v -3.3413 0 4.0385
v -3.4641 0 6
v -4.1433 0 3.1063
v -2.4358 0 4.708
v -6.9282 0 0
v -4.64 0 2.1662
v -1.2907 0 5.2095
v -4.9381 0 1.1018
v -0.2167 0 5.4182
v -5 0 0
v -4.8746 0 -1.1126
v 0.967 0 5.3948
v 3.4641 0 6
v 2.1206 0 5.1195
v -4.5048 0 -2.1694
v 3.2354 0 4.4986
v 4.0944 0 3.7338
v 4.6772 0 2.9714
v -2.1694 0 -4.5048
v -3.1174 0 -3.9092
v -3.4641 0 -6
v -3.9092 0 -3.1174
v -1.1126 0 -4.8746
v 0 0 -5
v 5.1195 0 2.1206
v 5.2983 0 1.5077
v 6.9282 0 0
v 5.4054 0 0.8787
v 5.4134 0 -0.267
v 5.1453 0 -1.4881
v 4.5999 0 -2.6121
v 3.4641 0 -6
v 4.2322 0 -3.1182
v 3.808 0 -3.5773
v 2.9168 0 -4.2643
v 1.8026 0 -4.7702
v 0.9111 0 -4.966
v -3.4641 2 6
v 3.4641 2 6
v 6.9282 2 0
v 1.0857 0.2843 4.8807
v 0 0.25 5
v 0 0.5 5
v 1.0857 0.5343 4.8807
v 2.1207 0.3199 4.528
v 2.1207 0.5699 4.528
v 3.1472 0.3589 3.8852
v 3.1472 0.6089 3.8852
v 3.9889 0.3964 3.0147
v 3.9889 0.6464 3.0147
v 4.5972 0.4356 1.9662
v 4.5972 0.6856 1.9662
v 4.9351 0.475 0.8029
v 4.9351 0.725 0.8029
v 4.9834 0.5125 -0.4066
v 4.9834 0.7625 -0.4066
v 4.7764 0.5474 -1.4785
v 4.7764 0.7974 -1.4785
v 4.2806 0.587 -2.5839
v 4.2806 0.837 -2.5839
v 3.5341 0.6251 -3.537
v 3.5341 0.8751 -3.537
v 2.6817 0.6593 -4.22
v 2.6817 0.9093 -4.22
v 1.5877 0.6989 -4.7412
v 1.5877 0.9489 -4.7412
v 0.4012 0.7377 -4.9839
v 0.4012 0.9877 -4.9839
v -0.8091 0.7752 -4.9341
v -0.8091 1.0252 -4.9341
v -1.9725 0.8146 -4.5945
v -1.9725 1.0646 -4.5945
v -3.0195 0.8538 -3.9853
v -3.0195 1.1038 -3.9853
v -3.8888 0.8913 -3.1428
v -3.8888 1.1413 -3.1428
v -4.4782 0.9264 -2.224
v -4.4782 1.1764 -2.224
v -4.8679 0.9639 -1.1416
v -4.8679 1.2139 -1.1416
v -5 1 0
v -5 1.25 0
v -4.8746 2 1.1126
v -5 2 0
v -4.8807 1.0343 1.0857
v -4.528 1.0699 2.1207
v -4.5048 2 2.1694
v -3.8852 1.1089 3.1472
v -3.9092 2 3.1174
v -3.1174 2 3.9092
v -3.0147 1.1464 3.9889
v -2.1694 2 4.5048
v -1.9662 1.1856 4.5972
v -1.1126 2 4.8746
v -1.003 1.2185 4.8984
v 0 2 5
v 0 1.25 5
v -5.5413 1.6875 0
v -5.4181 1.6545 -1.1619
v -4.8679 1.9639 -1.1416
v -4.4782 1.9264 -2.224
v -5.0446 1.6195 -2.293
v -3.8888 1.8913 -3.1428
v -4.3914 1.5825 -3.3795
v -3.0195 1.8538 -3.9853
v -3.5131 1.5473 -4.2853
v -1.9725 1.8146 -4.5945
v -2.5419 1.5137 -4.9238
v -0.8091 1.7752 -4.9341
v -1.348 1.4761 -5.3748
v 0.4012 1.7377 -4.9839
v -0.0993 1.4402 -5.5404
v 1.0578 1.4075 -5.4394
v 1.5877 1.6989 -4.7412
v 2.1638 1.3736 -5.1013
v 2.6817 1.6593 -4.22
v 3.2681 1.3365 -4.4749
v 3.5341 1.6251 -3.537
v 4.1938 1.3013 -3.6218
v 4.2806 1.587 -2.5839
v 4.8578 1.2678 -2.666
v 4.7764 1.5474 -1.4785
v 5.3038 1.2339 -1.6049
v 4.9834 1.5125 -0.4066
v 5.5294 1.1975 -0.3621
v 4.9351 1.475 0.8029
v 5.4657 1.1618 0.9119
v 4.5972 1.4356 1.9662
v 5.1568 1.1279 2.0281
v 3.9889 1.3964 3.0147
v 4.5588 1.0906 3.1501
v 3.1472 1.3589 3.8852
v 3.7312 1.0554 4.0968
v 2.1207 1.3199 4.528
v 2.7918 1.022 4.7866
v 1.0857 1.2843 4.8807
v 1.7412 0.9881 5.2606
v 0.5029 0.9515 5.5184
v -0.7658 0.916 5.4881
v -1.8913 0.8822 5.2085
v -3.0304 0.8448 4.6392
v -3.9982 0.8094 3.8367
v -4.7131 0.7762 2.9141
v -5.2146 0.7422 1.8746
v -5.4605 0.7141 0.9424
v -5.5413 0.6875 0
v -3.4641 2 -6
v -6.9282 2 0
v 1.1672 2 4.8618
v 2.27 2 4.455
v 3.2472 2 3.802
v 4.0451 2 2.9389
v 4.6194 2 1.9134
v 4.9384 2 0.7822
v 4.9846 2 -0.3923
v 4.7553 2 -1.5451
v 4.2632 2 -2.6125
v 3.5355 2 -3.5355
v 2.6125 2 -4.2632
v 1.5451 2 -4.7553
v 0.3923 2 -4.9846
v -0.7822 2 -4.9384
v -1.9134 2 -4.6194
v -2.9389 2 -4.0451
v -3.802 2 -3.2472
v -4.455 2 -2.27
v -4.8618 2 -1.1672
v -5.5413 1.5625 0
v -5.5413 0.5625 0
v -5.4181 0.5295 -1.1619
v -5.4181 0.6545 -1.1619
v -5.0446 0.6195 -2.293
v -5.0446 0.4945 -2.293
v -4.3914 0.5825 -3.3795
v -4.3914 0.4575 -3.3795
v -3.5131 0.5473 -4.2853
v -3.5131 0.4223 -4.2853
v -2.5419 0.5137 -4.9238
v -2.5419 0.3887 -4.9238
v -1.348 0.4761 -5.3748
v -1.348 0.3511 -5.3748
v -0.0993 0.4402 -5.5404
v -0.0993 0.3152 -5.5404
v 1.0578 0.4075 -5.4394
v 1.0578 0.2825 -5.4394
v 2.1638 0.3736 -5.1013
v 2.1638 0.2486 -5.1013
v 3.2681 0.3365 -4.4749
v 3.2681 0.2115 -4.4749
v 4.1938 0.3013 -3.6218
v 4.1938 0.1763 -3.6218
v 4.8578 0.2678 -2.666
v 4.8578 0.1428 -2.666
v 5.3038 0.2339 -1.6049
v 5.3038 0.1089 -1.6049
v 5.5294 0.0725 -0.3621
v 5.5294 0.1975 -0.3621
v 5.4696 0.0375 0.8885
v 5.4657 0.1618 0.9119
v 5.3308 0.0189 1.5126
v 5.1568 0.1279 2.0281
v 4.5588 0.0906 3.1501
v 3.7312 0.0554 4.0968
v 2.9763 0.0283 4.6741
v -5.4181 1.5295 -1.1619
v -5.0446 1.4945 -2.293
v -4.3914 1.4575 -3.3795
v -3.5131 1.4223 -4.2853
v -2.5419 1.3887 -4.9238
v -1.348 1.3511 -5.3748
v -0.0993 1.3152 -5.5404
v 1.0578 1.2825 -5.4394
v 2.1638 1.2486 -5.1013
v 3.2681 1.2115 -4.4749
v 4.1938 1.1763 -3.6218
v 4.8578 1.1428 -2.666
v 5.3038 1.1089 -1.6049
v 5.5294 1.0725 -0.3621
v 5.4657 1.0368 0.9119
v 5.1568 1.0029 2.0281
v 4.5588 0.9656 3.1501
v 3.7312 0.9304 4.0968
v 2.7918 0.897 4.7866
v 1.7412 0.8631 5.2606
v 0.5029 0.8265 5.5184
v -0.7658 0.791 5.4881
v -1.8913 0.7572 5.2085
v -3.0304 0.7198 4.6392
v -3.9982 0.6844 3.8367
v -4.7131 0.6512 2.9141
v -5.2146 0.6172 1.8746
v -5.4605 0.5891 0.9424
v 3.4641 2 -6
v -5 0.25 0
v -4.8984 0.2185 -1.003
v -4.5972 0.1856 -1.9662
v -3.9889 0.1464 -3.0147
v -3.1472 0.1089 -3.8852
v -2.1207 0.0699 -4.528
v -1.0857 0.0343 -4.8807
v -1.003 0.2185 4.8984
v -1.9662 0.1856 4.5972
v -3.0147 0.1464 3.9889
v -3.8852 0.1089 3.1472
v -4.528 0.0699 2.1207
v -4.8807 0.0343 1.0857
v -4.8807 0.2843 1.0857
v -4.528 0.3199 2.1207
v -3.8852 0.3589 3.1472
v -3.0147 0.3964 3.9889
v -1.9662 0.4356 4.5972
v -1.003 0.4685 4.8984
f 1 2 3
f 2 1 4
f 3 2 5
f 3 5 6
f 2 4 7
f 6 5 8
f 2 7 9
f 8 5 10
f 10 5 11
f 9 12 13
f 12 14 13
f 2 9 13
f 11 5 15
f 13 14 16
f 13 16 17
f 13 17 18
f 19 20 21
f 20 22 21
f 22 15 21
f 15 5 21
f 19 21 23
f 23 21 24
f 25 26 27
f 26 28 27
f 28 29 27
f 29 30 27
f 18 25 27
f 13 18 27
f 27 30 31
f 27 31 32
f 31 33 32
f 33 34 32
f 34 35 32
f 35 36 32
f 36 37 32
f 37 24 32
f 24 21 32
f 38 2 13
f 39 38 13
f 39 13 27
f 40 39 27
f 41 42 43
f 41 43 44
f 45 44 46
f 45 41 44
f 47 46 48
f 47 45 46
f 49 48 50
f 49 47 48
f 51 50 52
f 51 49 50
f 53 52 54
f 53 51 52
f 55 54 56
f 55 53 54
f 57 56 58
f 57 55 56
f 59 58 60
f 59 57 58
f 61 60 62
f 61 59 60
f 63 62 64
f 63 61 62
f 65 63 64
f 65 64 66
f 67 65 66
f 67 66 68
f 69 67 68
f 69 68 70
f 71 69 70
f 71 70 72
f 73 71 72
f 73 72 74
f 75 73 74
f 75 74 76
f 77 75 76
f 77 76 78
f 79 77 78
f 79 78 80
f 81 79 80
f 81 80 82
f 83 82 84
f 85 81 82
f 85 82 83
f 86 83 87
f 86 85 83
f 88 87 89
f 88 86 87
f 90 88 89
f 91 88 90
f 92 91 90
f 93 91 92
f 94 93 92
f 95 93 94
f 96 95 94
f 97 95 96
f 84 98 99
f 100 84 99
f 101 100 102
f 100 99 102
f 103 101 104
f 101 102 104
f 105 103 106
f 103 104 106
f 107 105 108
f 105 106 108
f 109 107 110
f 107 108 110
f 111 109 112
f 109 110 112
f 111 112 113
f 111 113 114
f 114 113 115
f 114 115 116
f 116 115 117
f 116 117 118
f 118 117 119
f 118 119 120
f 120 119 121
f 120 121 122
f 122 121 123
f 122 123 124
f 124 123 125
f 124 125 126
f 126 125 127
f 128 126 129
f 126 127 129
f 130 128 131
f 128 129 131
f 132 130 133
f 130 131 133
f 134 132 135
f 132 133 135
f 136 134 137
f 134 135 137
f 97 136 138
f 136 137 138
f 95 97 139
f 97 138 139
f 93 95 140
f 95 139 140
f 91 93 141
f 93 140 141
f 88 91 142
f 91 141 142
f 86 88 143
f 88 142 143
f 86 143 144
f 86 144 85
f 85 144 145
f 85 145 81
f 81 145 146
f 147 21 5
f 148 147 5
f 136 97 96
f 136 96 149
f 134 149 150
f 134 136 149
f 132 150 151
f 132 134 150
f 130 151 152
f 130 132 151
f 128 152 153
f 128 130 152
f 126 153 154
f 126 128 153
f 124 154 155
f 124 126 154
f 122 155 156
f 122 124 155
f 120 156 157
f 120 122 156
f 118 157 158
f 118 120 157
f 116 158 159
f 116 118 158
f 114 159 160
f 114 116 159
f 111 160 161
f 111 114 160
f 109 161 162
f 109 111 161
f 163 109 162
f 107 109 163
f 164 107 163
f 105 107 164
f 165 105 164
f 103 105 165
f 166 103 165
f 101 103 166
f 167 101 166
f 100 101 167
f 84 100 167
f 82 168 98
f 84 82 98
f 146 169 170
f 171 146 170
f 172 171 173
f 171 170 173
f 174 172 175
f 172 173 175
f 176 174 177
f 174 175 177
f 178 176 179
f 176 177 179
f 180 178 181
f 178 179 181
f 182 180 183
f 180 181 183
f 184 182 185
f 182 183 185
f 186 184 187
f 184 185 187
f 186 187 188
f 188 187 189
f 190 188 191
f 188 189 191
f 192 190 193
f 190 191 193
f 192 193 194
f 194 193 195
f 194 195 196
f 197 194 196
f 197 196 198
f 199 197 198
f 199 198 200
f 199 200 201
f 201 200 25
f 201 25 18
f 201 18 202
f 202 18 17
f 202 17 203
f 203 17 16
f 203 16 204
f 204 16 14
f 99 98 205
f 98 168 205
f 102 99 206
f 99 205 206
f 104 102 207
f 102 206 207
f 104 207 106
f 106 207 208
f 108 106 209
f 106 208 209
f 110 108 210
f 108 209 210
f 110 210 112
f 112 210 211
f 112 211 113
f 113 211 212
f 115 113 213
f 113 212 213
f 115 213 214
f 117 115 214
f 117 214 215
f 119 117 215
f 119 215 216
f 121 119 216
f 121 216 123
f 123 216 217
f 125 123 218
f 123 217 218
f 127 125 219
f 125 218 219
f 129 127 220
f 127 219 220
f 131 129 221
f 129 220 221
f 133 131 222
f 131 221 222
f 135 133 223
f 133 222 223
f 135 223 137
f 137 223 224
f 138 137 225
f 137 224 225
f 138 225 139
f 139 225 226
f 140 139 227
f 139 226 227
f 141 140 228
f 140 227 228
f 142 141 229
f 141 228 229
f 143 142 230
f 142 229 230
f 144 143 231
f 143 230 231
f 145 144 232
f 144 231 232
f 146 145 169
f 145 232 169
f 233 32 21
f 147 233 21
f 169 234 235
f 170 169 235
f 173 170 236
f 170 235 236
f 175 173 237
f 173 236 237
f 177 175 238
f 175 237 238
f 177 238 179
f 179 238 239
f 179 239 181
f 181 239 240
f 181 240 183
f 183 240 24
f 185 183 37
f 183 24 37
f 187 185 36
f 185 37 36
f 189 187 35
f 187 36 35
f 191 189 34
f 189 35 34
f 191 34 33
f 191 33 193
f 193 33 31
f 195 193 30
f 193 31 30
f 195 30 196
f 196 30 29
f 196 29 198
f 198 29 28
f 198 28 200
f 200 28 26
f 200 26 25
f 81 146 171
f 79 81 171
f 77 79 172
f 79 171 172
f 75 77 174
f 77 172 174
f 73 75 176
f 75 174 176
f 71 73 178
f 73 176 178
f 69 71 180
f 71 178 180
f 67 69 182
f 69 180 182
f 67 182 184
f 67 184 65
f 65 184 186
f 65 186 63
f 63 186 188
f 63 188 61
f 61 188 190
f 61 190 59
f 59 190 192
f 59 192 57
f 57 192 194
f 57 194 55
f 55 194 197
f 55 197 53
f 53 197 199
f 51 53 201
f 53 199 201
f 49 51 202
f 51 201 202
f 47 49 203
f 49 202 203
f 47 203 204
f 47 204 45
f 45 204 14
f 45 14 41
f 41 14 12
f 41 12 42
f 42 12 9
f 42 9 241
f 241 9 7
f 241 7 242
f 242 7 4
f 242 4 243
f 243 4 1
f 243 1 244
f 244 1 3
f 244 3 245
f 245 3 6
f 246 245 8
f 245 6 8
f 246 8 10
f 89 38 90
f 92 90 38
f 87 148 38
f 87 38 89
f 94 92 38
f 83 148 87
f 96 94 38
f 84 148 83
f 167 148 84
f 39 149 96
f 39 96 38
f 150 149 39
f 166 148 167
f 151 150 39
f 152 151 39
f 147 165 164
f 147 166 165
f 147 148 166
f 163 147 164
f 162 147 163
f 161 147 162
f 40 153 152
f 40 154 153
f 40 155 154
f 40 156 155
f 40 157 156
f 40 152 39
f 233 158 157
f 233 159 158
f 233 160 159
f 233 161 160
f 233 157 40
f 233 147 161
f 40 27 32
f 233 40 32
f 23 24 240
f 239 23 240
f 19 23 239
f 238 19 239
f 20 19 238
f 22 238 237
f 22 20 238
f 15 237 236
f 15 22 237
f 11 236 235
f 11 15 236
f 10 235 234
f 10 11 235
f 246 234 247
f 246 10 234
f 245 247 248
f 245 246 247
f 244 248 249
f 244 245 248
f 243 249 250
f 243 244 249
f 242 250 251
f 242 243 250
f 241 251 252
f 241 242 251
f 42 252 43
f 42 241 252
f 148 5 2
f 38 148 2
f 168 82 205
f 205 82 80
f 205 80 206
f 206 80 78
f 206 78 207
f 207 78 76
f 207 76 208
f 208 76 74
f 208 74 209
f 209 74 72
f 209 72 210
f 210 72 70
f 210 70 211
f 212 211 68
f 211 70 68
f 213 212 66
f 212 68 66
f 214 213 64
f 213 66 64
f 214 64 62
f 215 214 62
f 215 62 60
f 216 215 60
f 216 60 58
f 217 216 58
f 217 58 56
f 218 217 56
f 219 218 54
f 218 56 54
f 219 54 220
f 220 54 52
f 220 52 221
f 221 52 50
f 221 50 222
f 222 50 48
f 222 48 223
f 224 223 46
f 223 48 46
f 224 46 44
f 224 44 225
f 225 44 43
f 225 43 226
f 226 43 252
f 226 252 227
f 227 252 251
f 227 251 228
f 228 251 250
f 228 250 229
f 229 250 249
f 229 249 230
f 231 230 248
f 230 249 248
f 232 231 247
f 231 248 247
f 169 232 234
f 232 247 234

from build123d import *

# Parameters (mm, degrees)
SKETCH1_R           = 5
BOSS_EXTRUDE1_DEPTH = 2
THREAD1_PITCH       = 1


with BuildPart() as part:
    # Sketch1 → Boss-Extrude1 (new body)
    with BuildSketch(Plane(origin=(0, 0, 0), x_dir=(1, 0, 0), z_dir=(0, 1, 0))):
        Polygon((6.92820323, 0), (3.464101615, 6), (-3.464101615, 6), (-6.92820323, 0), (-3.464101615, -6), (3.464101615, -6), align=None)
        with Locations(Location((0, 0, 0), (0, 0, 270))):
            Circle(SKETCH1_R, mode=Mode.SUBTRACT)
    extrude(amount=BOSS_EXTRUDE1_DEPTH)

    # Thread1: the profile of Thread Profile1 profile screwed along a right-hand helix of 2 turns, 8 arcs to a turn; built about Z, then put on its axis
    thread1_z = Axis((0, 0, 0), (0, 0, 1))
    thread1_corners = [(4.9997, 0, -0.000173205), (5.541265875, 0, 0.312499999), (5.541265875, 0, 0.437499999), (4.9997, 0, 0.750173202)]
    with BuildLine(mode=Mode.PRIVATE) as thread1_profile:
        Line(thread1_corners[0], thread1_corners[1])
        Line(thread1_corners[1], thread1_corners[2])
        Line(thread1_corners[2], thread1_corners[3])
        Line(thread1_corners[3], thread1_corners[0])
    thread1_cap = Face(thread1_profile.wire())
    thread1_turn_angles = [0, 22.5, 45, 67.5, 90, 112.5, 135, 157.5, 180, 202.5, 225, 247.5, 270, 292.5, 315, 337.5, 360]
    thread1_turn_weights = [1, 0.9238795325112867, 1, 0.9238795325112867, 1, 0.9238795325112867, 1, 0.9238795325112867, 1, 0.9238795325112867, 1, 0.9238795325112867, 1, 0.9238795325112867, 1, 0.9238795325112867, 1]
    thread1_turn_rails = [Edge.make_bspline([Vector(p[0], p[1], 0).rotate(thread1_z, thread1_turn_angles[k]) / thread1_turn_weights[k] + Vector(0, 0, p[2] + THREAD1_PITCH * thread1_turn_angles[k] / 360) for k in range(17)], [0, 0, 0, 1, 1, 2, 2, 3, 3, 4, 4, 5, 5, 6, 6, 7, 7, 8, 8, 8], 2, thread1_turn_weights) for p in thread1_corners]
    thread1_turn_sides = [Face.make_surface_from_curves(thread1_turn_rails[p[0]], thread1_turn_rails[p[1]]) for p in [(0, 1), (1, 2), (2, 3), (3, 0)]]
    thread1 = Plane(origin=(0, 2, 0), x_dir=(-1, 0, 0), z_dir=(0, -1, 0)) * Solid(Shell([*[p.moved(Location((0, 0, THREAD1_PITCH * i))) for i in range(2) for p in thread1_turn_sides], thread1_cap, thread1_cap.rotate(thread1_z, 720).moved(Location((0, 0, THREAD1_PITCH * 720 / 360)))]))
    add(thread1, mode=Mode.SUBTRACT)


solid = part.part
